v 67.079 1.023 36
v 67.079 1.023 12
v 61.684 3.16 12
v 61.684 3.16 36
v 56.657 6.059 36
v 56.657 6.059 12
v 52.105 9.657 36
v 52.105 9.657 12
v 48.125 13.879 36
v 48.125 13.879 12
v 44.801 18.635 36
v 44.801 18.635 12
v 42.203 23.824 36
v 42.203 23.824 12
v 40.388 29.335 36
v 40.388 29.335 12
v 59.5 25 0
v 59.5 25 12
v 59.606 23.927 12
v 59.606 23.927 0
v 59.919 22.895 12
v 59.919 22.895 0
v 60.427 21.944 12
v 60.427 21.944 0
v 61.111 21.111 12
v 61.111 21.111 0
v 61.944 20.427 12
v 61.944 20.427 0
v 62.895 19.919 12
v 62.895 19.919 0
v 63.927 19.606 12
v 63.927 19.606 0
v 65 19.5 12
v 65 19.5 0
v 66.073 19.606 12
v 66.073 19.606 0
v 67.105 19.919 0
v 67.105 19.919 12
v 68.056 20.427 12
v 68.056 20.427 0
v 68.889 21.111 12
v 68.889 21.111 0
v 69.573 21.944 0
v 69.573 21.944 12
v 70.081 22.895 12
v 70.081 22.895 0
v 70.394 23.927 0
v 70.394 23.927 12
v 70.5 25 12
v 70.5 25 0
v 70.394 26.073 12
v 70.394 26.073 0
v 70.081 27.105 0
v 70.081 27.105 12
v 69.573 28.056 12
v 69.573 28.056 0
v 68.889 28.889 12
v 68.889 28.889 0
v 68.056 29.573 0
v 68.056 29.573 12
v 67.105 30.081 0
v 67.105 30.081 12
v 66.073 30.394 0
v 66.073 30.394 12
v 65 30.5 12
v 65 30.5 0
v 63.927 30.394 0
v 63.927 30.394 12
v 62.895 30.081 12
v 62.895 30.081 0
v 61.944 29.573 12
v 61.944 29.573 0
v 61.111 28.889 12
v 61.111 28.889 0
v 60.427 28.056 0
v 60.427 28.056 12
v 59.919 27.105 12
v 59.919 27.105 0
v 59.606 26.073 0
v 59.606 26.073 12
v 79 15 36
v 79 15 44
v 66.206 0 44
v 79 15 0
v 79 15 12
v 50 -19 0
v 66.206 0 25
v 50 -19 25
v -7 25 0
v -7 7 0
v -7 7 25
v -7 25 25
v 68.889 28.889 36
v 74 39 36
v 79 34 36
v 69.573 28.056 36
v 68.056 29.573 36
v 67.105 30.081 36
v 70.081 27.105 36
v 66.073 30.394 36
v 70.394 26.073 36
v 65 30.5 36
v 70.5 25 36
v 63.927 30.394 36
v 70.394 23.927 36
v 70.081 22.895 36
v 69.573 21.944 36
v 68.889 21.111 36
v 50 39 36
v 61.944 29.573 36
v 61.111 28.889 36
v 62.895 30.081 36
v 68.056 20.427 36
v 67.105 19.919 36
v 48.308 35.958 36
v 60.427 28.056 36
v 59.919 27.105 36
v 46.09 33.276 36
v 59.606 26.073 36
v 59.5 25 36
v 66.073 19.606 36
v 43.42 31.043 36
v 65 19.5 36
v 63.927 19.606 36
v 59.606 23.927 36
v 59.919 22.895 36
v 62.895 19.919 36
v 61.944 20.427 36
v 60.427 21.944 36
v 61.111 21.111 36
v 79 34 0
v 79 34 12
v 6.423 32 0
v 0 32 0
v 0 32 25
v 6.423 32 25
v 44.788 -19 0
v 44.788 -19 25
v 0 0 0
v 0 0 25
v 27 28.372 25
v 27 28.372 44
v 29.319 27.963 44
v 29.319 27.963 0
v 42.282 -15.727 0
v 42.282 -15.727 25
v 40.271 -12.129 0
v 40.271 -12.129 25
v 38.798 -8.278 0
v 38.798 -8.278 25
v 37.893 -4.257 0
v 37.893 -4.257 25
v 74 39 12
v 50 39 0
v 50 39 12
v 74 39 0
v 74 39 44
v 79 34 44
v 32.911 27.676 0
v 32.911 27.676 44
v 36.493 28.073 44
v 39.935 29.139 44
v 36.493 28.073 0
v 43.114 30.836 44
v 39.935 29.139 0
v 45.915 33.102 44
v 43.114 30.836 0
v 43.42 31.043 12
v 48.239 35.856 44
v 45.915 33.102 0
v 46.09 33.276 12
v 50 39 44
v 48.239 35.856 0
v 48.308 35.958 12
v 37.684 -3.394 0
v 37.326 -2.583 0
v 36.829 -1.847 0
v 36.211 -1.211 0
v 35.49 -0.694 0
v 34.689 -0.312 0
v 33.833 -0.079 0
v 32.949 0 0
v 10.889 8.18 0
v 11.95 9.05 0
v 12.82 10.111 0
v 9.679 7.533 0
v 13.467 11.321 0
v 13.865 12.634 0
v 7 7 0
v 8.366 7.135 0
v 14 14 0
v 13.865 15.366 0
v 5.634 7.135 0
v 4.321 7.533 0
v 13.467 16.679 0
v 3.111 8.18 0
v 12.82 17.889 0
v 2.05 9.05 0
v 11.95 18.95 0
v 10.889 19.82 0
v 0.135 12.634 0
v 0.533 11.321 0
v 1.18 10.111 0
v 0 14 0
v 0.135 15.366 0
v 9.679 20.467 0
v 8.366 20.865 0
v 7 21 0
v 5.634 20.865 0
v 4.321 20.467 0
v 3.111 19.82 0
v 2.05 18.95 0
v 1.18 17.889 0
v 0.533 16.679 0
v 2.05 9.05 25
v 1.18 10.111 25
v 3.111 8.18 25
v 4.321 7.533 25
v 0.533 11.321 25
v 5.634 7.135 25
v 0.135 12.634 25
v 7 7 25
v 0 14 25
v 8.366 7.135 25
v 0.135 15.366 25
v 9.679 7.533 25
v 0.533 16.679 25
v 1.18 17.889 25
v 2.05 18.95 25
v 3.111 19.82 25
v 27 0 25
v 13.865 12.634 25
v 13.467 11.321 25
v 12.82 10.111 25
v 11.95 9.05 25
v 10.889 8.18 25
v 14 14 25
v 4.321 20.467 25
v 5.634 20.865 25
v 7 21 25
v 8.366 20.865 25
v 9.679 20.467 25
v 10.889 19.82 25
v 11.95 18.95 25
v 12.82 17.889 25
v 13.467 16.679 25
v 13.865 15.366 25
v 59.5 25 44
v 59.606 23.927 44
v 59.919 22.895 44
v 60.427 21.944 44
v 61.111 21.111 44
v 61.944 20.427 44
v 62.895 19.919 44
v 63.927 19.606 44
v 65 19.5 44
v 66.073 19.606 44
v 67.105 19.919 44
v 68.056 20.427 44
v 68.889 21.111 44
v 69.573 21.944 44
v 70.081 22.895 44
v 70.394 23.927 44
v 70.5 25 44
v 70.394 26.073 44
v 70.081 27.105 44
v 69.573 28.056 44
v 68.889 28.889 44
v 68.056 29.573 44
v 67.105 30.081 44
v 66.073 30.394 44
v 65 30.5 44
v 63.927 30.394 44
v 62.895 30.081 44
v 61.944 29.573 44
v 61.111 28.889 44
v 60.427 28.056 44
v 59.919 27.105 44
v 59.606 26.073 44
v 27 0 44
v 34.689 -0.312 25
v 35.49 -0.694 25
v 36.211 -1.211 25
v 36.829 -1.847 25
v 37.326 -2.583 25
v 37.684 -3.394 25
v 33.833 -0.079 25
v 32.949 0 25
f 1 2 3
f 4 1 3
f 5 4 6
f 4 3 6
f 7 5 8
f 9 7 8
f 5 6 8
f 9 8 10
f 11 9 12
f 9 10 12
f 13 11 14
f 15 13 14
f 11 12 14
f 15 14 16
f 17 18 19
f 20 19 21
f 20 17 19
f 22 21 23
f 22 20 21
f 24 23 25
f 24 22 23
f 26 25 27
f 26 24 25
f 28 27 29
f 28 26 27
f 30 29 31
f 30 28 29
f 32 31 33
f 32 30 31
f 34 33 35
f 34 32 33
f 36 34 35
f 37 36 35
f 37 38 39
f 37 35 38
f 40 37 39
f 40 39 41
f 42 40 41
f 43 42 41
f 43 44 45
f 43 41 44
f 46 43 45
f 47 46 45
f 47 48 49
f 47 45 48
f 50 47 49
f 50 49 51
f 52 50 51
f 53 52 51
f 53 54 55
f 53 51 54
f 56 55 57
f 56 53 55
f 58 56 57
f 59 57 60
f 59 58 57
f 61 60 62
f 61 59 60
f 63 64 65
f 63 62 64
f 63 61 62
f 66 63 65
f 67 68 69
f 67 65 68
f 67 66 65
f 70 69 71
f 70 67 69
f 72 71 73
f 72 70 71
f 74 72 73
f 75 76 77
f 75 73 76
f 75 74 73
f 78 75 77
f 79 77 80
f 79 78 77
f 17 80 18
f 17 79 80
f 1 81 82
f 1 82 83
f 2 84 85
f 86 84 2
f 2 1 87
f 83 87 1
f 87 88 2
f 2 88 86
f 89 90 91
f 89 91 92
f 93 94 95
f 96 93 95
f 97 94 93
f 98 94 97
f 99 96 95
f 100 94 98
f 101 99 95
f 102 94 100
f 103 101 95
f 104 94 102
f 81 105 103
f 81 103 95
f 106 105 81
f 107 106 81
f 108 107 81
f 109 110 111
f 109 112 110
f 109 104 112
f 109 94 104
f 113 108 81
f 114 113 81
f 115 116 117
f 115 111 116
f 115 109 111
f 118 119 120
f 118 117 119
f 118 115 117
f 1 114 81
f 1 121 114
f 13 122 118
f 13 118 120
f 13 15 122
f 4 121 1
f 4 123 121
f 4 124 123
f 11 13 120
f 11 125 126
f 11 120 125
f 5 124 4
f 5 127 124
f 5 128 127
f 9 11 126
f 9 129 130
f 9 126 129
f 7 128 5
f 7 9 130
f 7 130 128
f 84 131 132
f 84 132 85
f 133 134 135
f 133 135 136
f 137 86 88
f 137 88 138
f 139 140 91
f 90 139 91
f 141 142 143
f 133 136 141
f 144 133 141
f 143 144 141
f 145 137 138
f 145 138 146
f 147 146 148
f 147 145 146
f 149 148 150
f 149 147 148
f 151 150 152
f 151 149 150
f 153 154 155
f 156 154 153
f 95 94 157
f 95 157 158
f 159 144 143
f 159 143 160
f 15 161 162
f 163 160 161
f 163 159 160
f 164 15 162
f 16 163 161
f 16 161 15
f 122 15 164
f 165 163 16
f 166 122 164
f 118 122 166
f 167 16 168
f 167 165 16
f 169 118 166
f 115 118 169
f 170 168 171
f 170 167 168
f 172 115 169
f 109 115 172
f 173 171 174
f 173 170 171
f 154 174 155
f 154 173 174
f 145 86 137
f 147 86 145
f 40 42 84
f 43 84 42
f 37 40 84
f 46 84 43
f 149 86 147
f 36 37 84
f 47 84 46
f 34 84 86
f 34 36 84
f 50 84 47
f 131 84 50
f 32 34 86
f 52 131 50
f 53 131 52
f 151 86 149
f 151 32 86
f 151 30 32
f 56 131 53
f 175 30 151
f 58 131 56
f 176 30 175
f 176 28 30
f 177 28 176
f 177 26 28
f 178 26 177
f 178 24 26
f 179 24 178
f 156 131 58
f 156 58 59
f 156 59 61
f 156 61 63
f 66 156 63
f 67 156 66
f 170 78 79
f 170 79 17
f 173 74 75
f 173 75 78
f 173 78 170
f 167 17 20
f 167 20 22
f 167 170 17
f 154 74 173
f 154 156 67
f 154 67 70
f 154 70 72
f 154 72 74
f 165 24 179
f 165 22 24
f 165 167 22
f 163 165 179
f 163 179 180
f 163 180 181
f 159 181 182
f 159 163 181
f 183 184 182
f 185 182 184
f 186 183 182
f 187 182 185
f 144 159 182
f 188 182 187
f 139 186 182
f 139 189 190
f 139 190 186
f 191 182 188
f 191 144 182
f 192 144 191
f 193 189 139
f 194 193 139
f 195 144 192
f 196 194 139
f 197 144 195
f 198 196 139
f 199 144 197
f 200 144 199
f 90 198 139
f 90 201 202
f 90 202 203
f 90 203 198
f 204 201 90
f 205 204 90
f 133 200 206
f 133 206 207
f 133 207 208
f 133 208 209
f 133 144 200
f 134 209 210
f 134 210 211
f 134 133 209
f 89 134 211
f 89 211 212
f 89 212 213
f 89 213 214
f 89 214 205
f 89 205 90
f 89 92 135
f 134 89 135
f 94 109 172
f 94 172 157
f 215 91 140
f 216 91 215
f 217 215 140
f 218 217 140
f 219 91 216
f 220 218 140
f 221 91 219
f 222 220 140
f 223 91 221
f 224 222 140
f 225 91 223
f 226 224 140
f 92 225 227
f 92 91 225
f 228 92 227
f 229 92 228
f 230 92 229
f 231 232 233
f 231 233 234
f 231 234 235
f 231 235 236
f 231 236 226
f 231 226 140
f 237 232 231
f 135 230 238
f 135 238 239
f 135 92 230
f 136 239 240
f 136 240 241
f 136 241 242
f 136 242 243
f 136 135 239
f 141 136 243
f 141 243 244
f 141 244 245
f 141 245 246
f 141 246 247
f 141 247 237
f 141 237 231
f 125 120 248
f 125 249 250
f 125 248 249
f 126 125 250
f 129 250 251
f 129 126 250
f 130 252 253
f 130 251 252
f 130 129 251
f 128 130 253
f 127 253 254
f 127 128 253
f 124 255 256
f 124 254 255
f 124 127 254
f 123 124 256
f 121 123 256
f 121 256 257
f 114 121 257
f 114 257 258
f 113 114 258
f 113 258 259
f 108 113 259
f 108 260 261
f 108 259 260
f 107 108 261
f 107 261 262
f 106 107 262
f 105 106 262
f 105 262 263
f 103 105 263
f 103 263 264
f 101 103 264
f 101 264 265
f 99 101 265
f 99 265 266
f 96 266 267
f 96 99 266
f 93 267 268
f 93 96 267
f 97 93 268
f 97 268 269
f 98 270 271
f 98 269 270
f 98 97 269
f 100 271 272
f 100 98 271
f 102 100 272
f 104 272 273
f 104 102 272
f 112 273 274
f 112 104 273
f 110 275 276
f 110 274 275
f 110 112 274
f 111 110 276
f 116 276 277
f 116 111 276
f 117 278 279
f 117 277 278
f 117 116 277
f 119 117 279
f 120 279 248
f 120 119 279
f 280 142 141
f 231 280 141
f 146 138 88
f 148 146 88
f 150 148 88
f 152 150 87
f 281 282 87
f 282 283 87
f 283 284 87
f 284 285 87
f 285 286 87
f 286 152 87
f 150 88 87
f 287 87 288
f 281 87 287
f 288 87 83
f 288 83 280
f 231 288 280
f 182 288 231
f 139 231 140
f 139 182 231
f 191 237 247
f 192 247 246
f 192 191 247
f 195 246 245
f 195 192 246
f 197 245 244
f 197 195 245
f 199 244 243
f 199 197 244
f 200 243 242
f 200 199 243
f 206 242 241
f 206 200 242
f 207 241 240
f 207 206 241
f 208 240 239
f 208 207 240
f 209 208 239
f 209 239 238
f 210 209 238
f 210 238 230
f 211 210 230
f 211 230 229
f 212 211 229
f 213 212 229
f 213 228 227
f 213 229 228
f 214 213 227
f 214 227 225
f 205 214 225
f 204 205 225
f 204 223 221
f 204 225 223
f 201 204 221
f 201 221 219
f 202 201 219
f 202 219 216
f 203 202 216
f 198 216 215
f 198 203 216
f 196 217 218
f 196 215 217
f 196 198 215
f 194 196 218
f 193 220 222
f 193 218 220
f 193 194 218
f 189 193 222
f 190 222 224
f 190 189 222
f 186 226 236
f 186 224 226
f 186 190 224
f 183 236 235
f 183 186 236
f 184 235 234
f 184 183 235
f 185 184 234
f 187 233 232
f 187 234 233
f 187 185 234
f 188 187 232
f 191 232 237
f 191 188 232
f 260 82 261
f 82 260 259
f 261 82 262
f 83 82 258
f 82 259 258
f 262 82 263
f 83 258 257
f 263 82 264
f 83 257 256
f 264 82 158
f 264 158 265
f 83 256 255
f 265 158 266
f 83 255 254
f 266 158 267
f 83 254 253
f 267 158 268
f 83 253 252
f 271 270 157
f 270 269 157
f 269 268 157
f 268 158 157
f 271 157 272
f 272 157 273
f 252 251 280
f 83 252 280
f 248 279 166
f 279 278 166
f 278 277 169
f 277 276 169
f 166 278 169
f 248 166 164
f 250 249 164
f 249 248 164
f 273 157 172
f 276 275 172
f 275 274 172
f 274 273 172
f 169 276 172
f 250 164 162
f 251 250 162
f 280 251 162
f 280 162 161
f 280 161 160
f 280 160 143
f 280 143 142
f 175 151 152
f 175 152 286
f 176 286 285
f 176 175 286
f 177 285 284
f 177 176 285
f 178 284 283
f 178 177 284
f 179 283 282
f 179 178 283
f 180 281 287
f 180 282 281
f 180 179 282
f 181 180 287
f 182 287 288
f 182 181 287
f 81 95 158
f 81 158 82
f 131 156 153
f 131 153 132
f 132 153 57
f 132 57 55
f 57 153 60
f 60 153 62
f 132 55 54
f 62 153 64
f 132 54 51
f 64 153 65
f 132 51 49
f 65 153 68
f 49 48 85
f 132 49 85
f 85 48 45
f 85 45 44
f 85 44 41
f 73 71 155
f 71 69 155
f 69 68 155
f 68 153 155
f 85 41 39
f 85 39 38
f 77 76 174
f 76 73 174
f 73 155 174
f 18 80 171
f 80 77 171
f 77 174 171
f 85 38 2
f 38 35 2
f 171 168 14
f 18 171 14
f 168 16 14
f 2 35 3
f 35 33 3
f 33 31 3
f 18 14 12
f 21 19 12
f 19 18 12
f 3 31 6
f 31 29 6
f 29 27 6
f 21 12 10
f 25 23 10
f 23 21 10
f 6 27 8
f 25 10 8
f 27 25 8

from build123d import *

# Parameters (mm, degrees)
SKETCH1_R           = 7
BOSS_EXTRUDE1_DEPTH = 44
SKETCH70_W          = 24
SKETCH70_H          = 39.803664443
SKETCH71_W          = 34
SKETCH71_H          = 19
CUT_EXTRUDE1_DEPTH  = 43
SKETCH73_R          = 5.5
CUT_EXTRUDE3_DEPTH  = 99.478424033
SKETCH75_W          = 19
SKETCH75_H          = 19
CUT_EXTRUDE4_DEPTH  = 105.177732746


with BuildPart() as part:
    # Sketch1 → Boss-Extrude1 (new body)
    with BuildSketch(Plane.XY):
        with BuildLine():
            Line((0, 0), (-7, 7))
            Line((-7, 7), (-7, 25))
            Line((-7, 25), (0, 32))
            Line((0, 32), (6.423127039, 32))
            Line((6.423127039, 32), (29.319429923, 27.962764043))
            ThreePointArc((29.319429923, 27.962764043), (41.564716358, 29.911963462), (50, 39))
            Line((50, 39), (74, 39))
            Line((74, 39), (79, 34))
            Line((79, 34), (79, 15))
            Line((79, 15), (50, -19))
            Line((50, -19), (44.788067397, -19))
            ThreePointArc((44.788067397, -19), (40.27095427, -12.128573817), (37.89327269, -4.256633834))
            ThreePointArc((37.89327269, -4.256633834), (36.210984968, -1.21075002), (32.948840798, 0))
            Line((32.948840798, 0), (0, 0))
        make_face()
        with Locations((7, 14)):
            Circle(SKETCH1_R, mode=Mode.SUBTRACT)
    extrude(amount=BOSS_EXTRUDE1_DEPTH)

    # Sketch70 → Cut-Revolve3 (revolve, cut)
    with BuildSketch(Plane(origin=(79, 0, 0), x_dir=(0, 0, -1), z_dir=(1, 0, 0))):
        with Locations((-24, 19.098167778)):
            Rectangle(SKETCH70_W, SKETCH70_H)
    revolve(axis=Axis((79, 39, 36), (0, 0, -1)), mode=Mode.SUBTRACT)

    # Sketch71 → Cut-Extrude1 (cut)
    with BuildSketch(Plane(origin=(0, 39, 0), x_dir=(1, 0, 0), z_dir=(0, 1, 0))):
        with Locations((10, -34.5)):
            Rectangle(SKETCH71_W, SKETCH71_H)
    extrude(amount=-CUT_EXTRUDE1_DEPTH, mode=Mode.SUBTRACT)

    # Sketch73 → Cut-Extrude3 (cut, through all)
    with BuildSketch(Plane.XY):
        with Locations(Location((65, 25, 0), (0, 0, 180))):
            Circle(SKETCH73_R)
    extrude(amount=CUT_EXTRUDE3_DEPTH, mode=Mode.SUBTRACT)

    # Sketch75 → Cut-Extrude4 (cut, through all)
    with BuildSketch(Plane(origin=(79, 0, 0), x_dir=(0, 0, -1), z_dir=(1, 0, 0))):
        with Locations((-34.5, -9.5)):
            Rectangle(SKETCH75_W, SKETCH75_H)
    extrude(amount=-CUT_EXTRUDE4_DEPTH, mode=Mode.SUBTRACT)


solid = part.part
